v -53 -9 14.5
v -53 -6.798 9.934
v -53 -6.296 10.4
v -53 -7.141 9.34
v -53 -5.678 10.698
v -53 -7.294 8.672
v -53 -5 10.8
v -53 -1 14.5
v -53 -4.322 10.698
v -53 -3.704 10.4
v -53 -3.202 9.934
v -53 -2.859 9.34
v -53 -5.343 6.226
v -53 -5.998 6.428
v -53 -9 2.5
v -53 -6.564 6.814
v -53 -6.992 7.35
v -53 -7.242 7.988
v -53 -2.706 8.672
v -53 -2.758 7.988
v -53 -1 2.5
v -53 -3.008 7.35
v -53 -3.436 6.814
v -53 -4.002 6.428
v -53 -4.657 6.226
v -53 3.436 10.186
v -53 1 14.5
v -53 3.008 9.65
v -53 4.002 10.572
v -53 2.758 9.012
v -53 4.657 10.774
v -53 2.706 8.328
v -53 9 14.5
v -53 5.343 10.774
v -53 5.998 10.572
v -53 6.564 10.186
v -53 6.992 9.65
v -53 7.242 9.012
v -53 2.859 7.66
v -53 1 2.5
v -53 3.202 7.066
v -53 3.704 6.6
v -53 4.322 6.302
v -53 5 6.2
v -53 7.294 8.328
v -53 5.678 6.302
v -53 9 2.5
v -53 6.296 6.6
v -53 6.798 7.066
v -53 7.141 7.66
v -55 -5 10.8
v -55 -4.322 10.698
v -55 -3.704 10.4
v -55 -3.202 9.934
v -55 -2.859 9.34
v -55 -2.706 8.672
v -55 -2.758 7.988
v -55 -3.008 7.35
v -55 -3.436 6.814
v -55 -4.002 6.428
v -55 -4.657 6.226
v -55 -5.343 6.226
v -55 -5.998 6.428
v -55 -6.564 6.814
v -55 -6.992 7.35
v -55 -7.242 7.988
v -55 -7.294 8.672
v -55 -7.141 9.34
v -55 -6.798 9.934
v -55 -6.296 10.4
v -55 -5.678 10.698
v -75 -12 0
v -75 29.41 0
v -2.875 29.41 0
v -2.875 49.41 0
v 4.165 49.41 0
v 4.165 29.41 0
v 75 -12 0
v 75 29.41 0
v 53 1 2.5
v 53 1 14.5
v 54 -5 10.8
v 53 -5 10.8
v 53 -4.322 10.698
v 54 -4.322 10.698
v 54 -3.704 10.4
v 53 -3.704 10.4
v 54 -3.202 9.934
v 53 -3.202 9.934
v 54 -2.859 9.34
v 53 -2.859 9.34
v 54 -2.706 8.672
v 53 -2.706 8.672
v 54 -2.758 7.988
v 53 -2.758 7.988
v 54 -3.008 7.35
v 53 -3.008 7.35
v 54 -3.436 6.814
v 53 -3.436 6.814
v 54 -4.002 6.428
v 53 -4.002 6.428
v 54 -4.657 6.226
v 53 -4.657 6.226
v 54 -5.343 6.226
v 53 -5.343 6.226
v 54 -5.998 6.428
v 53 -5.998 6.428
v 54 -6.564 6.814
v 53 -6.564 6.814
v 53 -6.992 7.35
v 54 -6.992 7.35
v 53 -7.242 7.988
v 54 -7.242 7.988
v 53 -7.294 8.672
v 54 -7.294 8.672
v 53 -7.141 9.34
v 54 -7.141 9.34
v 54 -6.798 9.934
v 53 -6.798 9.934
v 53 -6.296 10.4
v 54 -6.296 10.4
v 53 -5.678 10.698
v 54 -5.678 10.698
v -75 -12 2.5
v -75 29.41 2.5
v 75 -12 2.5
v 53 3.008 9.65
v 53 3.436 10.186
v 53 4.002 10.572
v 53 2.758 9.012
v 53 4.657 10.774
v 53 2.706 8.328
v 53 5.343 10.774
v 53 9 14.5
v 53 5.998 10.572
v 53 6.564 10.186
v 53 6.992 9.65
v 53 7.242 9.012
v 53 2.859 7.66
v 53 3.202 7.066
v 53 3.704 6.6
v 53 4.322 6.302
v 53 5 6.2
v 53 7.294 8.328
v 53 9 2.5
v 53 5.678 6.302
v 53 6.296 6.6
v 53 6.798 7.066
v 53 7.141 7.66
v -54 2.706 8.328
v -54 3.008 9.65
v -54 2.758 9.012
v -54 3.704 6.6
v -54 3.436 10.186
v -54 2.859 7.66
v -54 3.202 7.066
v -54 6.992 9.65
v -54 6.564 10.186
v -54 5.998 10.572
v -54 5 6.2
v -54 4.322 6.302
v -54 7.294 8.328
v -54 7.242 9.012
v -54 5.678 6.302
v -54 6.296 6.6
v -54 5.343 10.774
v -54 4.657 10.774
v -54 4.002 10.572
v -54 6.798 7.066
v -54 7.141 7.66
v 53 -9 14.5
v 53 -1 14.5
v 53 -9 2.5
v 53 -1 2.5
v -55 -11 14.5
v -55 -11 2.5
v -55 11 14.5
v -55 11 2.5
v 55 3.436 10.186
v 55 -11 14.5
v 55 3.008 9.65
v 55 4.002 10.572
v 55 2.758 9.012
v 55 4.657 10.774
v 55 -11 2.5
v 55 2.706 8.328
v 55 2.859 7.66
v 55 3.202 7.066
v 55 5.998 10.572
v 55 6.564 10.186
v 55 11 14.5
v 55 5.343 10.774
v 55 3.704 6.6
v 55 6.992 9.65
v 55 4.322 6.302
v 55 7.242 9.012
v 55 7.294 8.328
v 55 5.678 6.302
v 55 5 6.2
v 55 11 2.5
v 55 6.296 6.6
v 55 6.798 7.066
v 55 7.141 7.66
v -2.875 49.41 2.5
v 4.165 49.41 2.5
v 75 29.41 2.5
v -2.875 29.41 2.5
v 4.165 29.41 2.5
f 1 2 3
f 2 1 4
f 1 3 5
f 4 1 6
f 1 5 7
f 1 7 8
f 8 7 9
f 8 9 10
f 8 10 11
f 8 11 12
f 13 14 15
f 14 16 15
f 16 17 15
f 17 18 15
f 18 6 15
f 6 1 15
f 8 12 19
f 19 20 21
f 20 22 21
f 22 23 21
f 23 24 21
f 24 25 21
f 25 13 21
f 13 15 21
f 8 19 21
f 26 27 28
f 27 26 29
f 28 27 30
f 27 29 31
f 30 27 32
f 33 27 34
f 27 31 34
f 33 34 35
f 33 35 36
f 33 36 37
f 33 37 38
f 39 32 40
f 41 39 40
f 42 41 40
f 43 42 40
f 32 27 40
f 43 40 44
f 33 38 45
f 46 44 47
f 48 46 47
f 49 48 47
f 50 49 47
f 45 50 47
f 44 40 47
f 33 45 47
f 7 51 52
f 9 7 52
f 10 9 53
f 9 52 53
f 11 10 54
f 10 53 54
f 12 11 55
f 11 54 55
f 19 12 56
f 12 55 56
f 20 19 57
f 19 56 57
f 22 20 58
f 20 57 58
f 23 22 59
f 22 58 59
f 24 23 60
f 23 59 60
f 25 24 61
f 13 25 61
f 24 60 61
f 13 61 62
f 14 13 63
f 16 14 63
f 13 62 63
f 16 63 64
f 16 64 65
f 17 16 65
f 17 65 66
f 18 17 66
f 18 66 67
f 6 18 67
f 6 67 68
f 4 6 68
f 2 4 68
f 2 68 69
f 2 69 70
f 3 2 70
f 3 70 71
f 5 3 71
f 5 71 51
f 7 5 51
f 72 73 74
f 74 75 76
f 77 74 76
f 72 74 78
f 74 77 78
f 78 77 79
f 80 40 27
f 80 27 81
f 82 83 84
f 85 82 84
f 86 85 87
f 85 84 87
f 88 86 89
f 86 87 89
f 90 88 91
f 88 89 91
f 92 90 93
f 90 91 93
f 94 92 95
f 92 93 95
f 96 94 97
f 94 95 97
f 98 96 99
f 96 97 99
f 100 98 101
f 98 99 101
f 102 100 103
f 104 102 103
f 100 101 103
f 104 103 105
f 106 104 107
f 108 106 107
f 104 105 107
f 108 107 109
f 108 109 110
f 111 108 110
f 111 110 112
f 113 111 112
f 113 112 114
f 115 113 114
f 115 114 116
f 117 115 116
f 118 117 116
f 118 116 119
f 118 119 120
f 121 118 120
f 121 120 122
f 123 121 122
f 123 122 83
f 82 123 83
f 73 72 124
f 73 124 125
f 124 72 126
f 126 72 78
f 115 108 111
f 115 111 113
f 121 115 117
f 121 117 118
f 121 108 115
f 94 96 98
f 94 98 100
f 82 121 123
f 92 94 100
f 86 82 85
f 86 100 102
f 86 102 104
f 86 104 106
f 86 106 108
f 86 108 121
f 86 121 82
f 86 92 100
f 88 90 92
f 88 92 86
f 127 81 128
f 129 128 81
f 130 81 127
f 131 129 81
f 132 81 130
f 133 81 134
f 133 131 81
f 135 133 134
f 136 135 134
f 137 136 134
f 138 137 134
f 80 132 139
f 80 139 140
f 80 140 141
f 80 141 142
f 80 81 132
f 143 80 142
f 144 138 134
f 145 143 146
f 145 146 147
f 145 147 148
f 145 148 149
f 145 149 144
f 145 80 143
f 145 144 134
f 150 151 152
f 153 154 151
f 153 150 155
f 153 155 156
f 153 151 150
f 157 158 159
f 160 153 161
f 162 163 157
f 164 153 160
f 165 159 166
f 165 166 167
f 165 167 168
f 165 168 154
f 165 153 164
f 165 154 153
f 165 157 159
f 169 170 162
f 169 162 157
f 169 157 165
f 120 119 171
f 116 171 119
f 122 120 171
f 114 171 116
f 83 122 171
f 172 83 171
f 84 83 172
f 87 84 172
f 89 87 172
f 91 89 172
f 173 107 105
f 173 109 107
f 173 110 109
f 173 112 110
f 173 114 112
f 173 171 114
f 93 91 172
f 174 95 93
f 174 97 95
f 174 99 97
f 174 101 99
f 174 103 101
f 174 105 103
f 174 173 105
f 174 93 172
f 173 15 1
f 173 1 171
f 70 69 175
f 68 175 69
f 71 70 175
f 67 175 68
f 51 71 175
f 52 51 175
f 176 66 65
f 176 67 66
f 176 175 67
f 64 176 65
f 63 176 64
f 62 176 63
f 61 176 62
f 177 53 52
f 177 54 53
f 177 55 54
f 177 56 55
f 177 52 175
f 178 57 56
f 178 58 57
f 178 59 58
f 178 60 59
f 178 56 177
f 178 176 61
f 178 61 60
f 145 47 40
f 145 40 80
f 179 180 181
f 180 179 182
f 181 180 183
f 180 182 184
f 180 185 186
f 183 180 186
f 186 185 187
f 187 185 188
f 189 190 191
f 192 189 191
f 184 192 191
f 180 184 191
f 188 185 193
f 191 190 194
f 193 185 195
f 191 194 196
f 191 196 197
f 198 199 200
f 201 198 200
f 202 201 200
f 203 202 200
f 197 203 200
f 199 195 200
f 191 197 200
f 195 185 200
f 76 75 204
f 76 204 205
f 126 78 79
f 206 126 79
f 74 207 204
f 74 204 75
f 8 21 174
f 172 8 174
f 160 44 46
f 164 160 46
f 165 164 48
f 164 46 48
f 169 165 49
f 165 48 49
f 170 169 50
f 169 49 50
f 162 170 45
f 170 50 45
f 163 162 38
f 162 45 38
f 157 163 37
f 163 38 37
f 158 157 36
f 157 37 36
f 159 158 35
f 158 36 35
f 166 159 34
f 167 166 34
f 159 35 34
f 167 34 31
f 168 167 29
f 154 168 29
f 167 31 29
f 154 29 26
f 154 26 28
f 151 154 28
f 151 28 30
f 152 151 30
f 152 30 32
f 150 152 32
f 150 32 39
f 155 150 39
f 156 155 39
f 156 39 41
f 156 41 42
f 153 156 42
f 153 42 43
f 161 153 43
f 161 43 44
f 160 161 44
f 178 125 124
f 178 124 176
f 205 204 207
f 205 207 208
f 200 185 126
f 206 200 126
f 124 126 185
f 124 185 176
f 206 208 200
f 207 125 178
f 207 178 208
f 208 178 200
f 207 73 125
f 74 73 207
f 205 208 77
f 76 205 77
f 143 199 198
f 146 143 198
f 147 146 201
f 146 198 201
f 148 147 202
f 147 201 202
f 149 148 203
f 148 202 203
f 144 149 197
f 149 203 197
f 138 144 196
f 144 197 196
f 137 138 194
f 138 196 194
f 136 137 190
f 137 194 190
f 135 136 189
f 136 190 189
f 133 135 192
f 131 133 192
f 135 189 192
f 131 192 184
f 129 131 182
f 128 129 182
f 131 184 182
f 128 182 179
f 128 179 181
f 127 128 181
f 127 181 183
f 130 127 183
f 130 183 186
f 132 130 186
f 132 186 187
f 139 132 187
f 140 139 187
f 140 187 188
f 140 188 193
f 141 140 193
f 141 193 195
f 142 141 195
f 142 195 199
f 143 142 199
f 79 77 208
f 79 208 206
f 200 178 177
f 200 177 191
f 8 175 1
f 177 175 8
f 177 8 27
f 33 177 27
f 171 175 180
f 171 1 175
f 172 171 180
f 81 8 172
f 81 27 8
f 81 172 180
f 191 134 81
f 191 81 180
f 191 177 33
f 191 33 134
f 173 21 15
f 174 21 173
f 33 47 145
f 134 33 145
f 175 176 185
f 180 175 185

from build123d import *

# Parameters (mm, degrees)
SKETCH1_W           = 150
SKETCH1_H           = 41.41
BOSS_EXTRUDE1_DEPTH = 2.5
SKETCH5_W           = 110
SKETCH5_H           = 22
BOSS_EXTRUDE3_DEPTH = 12
SKETCH6_W           = 106
SKETCH6_H           = 8
CUT_EXTRUDE3_DEPTH  = 12
SKETCH7_R           = 2.3
CUT_EXTRUDE4_DEPTH  = 109
SKETCH8_R           = 2.3
CUT_EXTRUDE5_DEPTH  = 109
SKETCH9_W           = 7.040043687
SKETCH9_H           = 2.5
BOSS_EXTRUDE4_DEPTH = 20


with BuildPart() as part:
    # Sketch1 → Boss-Extrude1 (new body)
    with BuildSketch(Plane.XY):
        with Locations((0, 8.705)):
            Rectangle(SKETCH1_W, SKETCH1_H)
    extrude(amount=BOSS_EXTRUDE1_DEPTH)

    # Sketch5 → Boss-Extrude3 (add)
    with BuildSketch(Plane.XY.offset(2.5)):
        Rectangle(SKETCH5_W, SKETCH5_H)
    extrude(amount=BOSS_EXTRUDE3_DEPTH)

    # Sketch6 → Cut-Extrude3 (cut)
    with BuildSketch(Plane.XY.offset(2.5)):
        with Locations((0, 5)):
            Rectangle(SKETCH6_W, SKETCH6_H)
        with Locations((0, -5)):
            Rectangle(SKETCH6_W, SKETCH6_H)
    extrude(amount=CUT_EXTRUDE3_DEPTH, mode=Mode.SUBTRACT)

    # Sketch7 → Cut-Extrude4 (cut)
    with BuildSketch(Plane.ZY.offset(55)):
        with Locations((8.5, -5)):
            Circle(SKETCH7_R)
    extrude(amount=-CUT_EXTRUDE4_DEPTH, mode=Mode.SUBTRACT)

    # Sketch8 → Cut-Extrude5 (cut)
    with BuildSketch(Plane(origin=(55, 0, 0), x_dir=(0, 0, -1), z_dir=(1, 0, 0))):
        with Locations((-8.5, 5)):
            Circle(SKETCH8_R)
    extrude(amount=-CUT_EXTRUDE5_DEPTH, mode=Mode.SUBTRACT)

    # Sketch9 → Boss-Extrude4 (add)
    with BuildSketch(Plane(origin=(0, 29.41, 0), x_dir=(1, 0, 0), z_dir=(0, 1, 0))):
        with Locations((0.645201015, -1.25)):
            Rectangle(SKETCH9_W, SKETCH9_H)
    extrude(amount=BOSS_EXTRUDE4_DEPTH)


solid = part.part
